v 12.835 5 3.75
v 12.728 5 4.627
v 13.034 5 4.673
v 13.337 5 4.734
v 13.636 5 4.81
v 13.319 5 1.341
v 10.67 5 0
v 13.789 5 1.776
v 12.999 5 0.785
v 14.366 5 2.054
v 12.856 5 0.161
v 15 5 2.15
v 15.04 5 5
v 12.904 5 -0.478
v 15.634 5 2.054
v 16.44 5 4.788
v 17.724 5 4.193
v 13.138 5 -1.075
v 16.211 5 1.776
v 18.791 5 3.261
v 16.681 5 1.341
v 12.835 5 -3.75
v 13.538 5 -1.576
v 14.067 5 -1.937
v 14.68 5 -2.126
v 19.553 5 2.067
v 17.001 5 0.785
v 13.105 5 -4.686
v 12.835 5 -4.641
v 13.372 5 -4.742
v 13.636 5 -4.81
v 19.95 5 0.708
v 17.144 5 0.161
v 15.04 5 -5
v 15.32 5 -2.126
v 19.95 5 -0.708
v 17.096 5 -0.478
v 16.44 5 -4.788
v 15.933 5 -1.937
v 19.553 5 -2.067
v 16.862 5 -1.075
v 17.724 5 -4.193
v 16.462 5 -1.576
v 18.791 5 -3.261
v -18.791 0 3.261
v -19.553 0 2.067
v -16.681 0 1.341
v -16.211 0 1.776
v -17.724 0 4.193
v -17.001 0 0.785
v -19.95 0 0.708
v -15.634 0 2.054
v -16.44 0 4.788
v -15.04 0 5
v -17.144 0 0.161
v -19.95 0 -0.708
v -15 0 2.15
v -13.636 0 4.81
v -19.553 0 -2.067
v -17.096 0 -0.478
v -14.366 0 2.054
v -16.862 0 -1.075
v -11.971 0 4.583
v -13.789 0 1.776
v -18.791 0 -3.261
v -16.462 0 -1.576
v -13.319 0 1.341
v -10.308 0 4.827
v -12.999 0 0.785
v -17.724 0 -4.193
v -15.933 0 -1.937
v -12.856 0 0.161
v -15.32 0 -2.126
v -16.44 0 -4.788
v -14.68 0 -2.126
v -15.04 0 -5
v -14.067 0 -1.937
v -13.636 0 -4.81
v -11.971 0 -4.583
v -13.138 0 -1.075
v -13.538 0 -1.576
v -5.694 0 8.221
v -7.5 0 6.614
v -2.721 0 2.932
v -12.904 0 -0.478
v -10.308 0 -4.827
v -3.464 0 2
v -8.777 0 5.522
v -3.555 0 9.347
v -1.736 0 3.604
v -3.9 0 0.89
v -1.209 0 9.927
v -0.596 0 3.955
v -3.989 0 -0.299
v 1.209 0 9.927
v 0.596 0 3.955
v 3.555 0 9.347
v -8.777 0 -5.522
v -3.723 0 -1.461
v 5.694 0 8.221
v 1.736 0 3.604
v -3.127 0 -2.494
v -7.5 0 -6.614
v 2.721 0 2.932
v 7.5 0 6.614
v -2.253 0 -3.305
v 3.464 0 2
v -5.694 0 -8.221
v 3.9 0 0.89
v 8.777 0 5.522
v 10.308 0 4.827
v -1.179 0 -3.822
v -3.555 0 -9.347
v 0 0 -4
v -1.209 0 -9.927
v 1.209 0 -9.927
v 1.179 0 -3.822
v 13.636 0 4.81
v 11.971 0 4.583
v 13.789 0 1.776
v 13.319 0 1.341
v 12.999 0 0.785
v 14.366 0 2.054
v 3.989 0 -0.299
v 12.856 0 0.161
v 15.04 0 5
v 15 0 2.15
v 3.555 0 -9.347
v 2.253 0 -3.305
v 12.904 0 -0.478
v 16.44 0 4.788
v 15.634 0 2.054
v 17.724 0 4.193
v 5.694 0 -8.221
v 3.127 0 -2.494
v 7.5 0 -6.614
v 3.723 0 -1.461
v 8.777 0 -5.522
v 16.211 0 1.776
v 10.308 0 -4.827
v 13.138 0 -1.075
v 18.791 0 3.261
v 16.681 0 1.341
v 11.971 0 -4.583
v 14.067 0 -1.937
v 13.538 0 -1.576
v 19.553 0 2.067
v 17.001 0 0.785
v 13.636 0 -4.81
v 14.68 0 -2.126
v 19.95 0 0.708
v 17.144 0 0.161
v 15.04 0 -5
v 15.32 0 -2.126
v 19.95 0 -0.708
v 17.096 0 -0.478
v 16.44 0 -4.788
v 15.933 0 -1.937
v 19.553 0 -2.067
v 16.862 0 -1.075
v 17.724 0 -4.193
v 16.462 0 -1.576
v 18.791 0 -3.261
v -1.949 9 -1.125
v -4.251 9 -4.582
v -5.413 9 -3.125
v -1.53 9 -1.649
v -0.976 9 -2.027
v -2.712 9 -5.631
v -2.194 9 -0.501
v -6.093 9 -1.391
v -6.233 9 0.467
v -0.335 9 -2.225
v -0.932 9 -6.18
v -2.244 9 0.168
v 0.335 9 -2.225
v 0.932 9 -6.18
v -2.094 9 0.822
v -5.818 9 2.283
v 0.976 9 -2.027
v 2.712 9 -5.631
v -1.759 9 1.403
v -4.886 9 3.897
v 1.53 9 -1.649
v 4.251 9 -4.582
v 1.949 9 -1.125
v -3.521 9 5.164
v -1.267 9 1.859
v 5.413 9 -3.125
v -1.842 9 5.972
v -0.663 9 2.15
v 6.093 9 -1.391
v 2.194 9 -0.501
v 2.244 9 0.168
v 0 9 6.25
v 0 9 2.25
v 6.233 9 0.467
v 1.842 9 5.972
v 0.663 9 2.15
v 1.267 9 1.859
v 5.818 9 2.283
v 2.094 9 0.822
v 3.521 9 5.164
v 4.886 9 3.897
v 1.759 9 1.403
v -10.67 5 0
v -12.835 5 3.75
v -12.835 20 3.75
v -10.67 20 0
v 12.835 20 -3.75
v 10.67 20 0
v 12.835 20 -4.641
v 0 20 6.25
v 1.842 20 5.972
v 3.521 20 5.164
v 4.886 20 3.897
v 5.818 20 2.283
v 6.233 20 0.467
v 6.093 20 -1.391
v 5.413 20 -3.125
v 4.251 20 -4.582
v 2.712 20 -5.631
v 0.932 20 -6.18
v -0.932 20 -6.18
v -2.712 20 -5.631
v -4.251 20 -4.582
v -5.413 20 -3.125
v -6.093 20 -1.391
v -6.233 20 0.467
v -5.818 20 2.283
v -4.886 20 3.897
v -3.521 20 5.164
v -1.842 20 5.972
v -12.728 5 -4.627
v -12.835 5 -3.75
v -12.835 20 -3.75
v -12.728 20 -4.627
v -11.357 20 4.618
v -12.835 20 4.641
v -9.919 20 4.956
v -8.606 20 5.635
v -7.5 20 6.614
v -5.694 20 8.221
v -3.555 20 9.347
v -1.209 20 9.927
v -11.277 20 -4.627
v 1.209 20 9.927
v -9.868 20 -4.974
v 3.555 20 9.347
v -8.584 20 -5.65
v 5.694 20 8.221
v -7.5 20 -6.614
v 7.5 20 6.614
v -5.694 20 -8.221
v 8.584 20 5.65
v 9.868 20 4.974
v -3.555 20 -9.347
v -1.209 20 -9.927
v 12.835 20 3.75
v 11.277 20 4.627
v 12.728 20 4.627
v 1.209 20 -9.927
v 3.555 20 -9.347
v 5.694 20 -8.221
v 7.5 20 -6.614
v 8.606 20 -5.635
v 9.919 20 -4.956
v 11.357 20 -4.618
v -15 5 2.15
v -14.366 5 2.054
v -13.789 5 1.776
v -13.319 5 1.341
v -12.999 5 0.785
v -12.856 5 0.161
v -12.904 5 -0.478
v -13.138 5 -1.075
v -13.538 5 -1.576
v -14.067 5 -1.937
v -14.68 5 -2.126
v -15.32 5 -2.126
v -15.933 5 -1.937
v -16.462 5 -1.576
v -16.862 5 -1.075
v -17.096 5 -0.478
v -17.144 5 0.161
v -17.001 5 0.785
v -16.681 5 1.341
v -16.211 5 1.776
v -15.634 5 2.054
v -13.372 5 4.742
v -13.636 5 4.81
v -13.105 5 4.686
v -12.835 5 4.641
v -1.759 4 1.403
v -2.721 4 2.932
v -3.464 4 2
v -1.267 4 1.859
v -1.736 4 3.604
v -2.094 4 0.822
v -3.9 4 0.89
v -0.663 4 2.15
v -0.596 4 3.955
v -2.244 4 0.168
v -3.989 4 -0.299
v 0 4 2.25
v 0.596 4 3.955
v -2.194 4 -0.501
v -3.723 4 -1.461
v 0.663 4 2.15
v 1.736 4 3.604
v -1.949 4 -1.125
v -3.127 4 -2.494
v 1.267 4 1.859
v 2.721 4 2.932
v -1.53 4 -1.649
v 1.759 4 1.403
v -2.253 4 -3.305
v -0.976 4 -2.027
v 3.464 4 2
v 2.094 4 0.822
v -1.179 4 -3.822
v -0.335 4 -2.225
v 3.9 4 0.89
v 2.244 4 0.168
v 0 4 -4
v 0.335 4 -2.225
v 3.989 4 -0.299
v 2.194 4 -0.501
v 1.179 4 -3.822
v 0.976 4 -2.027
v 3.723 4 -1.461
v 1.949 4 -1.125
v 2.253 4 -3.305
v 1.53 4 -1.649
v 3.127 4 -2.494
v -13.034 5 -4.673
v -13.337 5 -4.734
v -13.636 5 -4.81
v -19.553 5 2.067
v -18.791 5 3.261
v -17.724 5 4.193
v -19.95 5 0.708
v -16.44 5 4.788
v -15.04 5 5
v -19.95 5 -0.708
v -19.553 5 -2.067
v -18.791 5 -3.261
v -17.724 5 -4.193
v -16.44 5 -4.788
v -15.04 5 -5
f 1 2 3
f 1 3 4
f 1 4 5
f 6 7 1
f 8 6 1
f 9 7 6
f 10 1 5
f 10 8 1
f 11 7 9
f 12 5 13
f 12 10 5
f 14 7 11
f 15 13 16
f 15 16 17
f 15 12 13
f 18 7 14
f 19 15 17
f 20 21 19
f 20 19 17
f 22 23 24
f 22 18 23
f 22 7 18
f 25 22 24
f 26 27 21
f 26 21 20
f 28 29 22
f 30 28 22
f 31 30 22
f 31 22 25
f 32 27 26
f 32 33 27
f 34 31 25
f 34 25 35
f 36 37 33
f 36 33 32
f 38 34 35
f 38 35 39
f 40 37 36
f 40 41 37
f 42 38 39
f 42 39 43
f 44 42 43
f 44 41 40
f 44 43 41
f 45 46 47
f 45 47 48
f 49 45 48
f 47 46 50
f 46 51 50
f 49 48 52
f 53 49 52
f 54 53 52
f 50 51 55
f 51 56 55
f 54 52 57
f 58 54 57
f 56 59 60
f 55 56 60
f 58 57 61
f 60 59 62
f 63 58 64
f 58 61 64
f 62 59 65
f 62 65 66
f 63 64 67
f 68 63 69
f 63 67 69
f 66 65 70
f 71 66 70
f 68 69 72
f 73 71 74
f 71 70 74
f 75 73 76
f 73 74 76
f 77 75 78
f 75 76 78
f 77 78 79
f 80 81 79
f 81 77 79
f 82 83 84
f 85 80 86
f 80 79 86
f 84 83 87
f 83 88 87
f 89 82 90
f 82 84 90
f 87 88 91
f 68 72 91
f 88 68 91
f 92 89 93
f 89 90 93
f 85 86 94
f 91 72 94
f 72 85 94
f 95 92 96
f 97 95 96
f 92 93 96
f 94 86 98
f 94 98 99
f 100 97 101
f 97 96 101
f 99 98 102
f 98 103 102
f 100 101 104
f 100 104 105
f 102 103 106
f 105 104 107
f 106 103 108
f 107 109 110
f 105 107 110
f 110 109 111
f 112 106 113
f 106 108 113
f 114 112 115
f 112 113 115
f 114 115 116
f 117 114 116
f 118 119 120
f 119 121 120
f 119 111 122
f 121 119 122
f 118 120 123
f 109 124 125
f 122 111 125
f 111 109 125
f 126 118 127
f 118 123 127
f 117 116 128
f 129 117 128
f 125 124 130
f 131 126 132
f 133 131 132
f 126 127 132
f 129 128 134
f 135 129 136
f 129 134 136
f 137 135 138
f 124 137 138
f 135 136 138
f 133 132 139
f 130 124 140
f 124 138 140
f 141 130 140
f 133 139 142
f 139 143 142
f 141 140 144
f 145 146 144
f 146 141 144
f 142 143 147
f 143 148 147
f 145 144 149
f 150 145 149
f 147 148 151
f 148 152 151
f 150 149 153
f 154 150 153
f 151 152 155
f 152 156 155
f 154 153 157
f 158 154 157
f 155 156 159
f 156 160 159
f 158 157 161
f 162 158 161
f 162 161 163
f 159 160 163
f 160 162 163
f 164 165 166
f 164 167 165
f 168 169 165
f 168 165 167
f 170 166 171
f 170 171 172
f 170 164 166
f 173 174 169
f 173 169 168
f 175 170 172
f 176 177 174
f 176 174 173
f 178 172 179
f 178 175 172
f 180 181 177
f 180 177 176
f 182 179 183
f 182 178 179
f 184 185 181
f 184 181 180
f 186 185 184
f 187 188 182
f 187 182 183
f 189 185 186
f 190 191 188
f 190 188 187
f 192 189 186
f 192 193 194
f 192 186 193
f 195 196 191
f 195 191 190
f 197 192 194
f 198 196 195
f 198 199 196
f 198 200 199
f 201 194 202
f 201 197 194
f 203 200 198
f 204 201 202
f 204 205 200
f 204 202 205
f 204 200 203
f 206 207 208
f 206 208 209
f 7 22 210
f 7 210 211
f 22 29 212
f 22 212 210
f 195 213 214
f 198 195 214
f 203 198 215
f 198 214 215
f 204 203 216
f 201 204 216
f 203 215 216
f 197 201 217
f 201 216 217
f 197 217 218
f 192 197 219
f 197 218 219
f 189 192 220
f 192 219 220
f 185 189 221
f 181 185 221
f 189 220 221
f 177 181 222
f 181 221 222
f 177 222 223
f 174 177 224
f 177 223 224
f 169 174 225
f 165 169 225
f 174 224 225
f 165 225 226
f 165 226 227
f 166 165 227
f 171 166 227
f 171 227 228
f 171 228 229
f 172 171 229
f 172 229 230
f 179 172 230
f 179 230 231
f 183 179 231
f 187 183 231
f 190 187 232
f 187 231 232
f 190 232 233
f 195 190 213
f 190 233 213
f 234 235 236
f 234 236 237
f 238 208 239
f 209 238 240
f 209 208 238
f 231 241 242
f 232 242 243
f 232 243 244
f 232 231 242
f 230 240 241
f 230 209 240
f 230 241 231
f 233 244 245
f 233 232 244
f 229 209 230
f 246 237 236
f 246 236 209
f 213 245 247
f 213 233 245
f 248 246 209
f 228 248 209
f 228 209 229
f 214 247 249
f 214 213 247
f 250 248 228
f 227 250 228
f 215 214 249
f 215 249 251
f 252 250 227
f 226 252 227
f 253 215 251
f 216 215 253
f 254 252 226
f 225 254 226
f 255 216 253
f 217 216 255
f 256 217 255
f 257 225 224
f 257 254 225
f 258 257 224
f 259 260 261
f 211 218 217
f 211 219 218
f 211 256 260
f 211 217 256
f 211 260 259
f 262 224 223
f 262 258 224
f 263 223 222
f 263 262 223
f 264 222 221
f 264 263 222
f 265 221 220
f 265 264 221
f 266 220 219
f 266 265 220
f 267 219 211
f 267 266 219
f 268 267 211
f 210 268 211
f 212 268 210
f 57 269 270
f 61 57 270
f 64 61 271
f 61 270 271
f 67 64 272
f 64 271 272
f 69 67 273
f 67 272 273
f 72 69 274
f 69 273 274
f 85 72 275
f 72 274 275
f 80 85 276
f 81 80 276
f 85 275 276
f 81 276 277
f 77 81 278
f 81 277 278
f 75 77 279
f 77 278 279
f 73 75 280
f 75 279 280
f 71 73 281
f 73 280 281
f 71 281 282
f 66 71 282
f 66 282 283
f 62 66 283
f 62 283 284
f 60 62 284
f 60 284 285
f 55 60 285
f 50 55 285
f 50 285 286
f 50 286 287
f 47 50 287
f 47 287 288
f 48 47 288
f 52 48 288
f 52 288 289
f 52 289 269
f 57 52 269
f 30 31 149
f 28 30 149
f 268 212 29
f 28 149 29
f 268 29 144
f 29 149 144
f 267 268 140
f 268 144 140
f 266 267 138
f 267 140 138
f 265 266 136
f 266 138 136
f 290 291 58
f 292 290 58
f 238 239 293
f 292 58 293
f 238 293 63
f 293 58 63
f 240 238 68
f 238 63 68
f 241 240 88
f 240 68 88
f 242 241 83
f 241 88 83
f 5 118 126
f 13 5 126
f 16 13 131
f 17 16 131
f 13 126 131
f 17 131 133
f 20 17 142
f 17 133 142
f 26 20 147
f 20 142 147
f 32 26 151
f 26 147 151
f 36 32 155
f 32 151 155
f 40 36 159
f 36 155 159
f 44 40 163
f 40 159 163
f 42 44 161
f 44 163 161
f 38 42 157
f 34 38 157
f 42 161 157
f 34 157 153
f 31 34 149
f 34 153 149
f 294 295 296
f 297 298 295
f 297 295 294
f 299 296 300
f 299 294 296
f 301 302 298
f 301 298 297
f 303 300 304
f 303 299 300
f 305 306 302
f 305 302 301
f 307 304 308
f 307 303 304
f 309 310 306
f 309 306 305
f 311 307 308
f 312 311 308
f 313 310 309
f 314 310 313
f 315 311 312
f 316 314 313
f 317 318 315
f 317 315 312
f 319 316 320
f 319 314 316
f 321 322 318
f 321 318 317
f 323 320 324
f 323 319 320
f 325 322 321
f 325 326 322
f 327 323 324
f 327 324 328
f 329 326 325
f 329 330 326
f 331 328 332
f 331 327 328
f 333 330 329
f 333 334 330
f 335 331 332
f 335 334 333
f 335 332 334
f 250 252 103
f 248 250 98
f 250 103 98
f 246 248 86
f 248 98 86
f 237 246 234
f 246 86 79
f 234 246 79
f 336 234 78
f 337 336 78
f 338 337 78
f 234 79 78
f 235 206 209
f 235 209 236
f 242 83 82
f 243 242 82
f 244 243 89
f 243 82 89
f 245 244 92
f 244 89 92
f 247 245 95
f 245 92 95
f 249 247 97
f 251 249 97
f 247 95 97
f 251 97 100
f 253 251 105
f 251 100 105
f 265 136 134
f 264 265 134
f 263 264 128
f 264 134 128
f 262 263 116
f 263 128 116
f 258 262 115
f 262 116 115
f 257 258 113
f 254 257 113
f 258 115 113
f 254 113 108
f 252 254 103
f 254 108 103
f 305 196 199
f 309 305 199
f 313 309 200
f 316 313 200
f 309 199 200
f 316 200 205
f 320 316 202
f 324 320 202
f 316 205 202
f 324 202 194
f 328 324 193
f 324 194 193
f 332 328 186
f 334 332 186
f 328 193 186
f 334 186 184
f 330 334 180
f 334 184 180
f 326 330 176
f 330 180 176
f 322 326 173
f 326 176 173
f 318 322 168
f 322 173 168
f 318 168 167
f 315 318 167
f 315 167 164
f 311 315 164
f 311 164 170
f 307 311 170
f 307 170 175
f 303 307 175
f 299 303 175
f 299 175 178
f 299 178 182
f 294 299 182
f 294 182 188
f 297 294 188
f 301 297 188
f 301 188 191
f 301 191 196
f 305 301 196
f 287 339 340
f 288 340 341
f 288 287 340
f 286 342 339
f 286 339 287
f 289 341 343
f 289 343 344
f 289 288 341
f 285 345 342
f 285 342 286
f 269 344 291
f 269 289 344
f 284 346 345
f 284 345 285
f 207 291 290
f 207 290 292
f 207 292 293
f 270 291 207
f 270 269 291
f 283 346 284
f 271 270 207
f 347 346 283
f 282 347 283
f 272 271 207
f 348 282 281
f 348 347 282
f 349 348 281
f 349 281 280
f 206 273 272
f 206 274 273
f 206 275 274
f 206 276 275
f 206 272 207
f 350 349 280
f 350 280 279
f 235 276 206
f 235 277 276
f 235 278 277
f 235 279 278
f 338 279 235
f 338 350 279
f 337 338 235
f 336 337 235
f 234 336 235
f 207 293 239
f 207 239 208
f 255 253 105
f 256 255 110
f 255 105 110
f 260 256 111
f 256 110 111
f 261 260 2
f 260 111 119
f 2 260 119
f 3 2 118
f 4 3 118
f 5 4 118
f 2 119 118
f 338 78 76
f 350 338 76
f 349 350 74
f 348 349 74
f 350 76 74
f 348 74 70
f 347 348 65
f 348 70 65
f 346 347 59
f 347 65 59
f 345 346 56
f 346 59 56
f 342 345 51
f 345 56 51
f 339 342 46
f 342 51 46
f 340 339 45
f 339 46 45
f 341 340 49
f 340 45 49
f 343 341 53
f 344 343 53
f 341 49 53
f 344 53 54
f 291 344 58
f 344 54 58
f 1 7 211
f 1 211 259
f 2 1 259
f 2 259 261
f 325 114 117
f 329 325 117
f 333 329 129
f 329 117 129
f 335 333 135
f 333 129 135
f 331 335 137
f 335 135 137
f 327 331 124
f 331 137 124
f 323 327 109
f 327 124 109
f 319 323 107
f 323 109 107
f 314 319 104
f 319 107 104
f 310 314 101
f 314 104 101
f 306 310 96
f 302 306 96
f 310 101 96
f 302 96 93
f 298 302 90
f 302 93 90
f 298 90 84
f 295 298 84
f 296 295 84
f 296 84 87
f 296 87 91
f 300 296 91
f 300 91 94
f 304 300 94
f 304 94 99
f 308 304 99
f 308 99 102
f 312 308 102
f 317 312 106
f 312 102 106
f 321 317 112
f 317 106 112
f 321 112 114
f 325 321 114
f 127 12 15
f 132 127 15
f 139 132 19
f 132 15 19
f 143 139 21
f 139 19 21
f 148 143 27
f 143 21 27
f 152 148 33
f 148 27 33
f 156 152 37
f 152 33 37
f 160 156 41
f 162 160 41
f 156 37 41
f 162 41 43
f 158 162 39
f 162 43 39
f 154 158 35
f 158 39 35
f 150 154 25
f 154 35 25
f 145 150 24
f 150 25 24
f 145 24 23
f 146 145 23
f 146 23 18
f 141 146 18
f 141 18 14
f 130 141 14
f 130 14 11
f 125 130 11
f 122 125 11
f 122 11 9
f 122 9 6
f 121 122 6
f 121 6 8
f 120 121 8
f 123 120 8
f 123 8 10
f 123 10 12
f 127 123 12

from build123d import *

# Parameters (mm, degrees)
BOSS_EXTRUDE1_DEPTH = 20
SKETCH2_R           = 6.25
CUT_EXTRUDE1_DEPTH  = 11
SKETCH2_3_R         = 2.15
CUT_EXTRUDE2_DEPTH  = 31
CUT_EXTRUDE3_START  = -15
SKETCH2_4_R         = 2.15
CUT_EXTRUDE3_DEPTH  = 15
SKETCH3_R           = 2.25
CUT_EXTRUDE4_DEPTH  = 25.919871589
SKETCH4_R           = 4
CUT_EXTRUDE5_DEPTH  = 4


with BuildPart() as part:
    # Sketch1 → Boss-Extrude1 (new body)
    with BuildSketch(Plane(origin=(0, 0, 0), x_dir=(1, 0, 0), z_dir=(0, 1, 0))):
        with BuildLine():
            ThreePointArc((-7.5, -6.614378278), (0, -10), (7.5, -6.614378278))
            ThreePointArc((7.5, -6.614378278), (10.307771776, -4.826585903), (13.636363636, -4.810456929))
            ThreePointArc((13.636363636, -4.810456929), (20, 0), (13.636363636, 4.810456929))
            ThreePointArc((13.636363636, 4.810456929), (10.307771776, 4.826585903), (7.5, 6.614378278))
            ThreePointArc((7.5, 6.614378278), (0, 10), (-7.5, 6.614378278))
            ThreePointArc((-7.5, 6.614378278), (-10.307771776, 4.826585903), (-13.636363636, 4.810456929))
            ThreePointArc((-13.636363636, 4.810456929), (-20, 0), (-13.636363636, -4.810456929))
            ThreePointArc((-13.636363636, -4.810456929), (-10.307771776, -4.826585903), (-7.5, -6.614378278))
        make_face()
    extrude(amount=BOSS_EXTRUDE1_DEPTH)

    # Sketch2 → Cut-Extrude1 (cut)
    with BuildSketch(Plane(origin=(0, 20, 0), x_dir=(1, 0, 0), z_dir=(0, 1, 0))):
        with Locations(Location((0, 0, 0), (0, 0, 270))):
            Circle(SKETCH2_R)
    extrude(amount=-CUT_EXTRUDE1_DEPTH, mode=Mode.SUBTRACT)

    # Sketch2<3> → Cut-Extrude2 (cut, through all)
    with BuildSketch(Plane(origin=(0, 20, 0), x_dir=(1, 0, 0), z_dir=(0, 1, 0))):
        with Locations(Location((-15, 0, 0), (0, 0, 270))):
            Circle(SKETCH2_3_R)
        with Locations(Location((15, 0, 0), (0, 0, 270))):
            Circle(SKETCH2_3_R)
    extrude(amount=-CUT_EXTRUDE2_DEPTH, mode=Mode.SUBTRACT)

    # Sketch2<4> → Cut-Extrude3 (cut)
    # profile 1 of 2: a face of its own
    with BuildSketch(Plane(origin=(0, 20, 0), x_dir=(1, 0, 0), z_dir=(0, 1, 0)).offset(CUT_EXTRUDE3_START)):
        with BuildLine():
            Line((-10.669872981, 0), (-12.834936491, 3.75))
            Line((-12.834936491, 3.75), (-12.727737442, 4.627302245))
            ThreePointArc((-12.727737442, 4.627302245), (-13.185592631, 4.701307351), (-13.636363636, 4.810456929))
            ThreePointArc((-13.636363636, 4.810456929), (-20, 0), (-13.636363636, -4.810456929))
            ThreePointArc((-13.636363636, -4.810456929), (-13.238538502, -4.712228262), (-12.834936491, -4.641382481))
            Line((-12.834936491, -4.641382481), (-12.834936491, -3.75))
            Line((-12.834936491, -3.75), (-10.669872981, 0))
        make_face()
        with Locations(Location((-15, 0, 0), (0, 0, 270))):
            Circle(SKETCH2_4_R, mode=Mode.SUBTRACT)
    # profile 2 of 2: a face of its own
    with BuildSketch(Plane(origin=(0, 20, 0), x_dir=(1, 0, 0), z_dir=(0, 1, 0)).offset(CUT_EXTRUDE3_START)):
        with BuildLine():
            ThreePointArc((13.636363636, 4.810456929), (13.238538502, 4.712228262), (12.834936491, 4.641382481))
            Line((12.834936491, 4.641382481), (12.834936491, 3.75))
            Line((12.834936491, 3.75), (10.669872981, 0))
            Line((10.669872981, 0), (12.834936491, -3.75))
            Line((12.834936491, -3.75), (12.727737442, -4.627302245))
            ThreePointArc((12.727737442, -4.627302245), (13.185592631, -4.701307351), (13.636363636, -4.810456929))
            ThreePointArc((13.636363636, -4.810456929), (20, 0), (13.636363636, 4.810456929))
        make_face()
        with Locations(Location((15, 0, 0), (0, 0, 270))):
            Circle(SKETCH2_4_R, mode=Mode.SUBTRACT)
    extrude(amount=CUT_EXTRUDE3_DEPTH, mode=Mode.SUBTRACT)

    # Sketch3 → Cut-Extrude4 (cut, through all)
    with BuildSketch(Plane(origin=(0, 9, 0), x_dir=(1, 0, 0), z_dir=(0, 1, 0))):
        with Locations(Location((0, 0, 0), (0, 0, 270))):
            Circle(SKETCH3_R)
    extrude(amount=-CUT_EXTRUDE4_DEPTH, mode=Mode.SUBTRACT)

    # Sketch4 → Cut-Extrude5 (cut)
    with BuildSketch(Plane.XZ):
        with Locations(Location((0, 0, 0), (0, 0, 270))):
            Circle(SKETCH4_R)
    extrude(amount=-CUT_EXTRUDE5_DEPTH, mode=Mode.SUBTRACT)


solid = part.part
